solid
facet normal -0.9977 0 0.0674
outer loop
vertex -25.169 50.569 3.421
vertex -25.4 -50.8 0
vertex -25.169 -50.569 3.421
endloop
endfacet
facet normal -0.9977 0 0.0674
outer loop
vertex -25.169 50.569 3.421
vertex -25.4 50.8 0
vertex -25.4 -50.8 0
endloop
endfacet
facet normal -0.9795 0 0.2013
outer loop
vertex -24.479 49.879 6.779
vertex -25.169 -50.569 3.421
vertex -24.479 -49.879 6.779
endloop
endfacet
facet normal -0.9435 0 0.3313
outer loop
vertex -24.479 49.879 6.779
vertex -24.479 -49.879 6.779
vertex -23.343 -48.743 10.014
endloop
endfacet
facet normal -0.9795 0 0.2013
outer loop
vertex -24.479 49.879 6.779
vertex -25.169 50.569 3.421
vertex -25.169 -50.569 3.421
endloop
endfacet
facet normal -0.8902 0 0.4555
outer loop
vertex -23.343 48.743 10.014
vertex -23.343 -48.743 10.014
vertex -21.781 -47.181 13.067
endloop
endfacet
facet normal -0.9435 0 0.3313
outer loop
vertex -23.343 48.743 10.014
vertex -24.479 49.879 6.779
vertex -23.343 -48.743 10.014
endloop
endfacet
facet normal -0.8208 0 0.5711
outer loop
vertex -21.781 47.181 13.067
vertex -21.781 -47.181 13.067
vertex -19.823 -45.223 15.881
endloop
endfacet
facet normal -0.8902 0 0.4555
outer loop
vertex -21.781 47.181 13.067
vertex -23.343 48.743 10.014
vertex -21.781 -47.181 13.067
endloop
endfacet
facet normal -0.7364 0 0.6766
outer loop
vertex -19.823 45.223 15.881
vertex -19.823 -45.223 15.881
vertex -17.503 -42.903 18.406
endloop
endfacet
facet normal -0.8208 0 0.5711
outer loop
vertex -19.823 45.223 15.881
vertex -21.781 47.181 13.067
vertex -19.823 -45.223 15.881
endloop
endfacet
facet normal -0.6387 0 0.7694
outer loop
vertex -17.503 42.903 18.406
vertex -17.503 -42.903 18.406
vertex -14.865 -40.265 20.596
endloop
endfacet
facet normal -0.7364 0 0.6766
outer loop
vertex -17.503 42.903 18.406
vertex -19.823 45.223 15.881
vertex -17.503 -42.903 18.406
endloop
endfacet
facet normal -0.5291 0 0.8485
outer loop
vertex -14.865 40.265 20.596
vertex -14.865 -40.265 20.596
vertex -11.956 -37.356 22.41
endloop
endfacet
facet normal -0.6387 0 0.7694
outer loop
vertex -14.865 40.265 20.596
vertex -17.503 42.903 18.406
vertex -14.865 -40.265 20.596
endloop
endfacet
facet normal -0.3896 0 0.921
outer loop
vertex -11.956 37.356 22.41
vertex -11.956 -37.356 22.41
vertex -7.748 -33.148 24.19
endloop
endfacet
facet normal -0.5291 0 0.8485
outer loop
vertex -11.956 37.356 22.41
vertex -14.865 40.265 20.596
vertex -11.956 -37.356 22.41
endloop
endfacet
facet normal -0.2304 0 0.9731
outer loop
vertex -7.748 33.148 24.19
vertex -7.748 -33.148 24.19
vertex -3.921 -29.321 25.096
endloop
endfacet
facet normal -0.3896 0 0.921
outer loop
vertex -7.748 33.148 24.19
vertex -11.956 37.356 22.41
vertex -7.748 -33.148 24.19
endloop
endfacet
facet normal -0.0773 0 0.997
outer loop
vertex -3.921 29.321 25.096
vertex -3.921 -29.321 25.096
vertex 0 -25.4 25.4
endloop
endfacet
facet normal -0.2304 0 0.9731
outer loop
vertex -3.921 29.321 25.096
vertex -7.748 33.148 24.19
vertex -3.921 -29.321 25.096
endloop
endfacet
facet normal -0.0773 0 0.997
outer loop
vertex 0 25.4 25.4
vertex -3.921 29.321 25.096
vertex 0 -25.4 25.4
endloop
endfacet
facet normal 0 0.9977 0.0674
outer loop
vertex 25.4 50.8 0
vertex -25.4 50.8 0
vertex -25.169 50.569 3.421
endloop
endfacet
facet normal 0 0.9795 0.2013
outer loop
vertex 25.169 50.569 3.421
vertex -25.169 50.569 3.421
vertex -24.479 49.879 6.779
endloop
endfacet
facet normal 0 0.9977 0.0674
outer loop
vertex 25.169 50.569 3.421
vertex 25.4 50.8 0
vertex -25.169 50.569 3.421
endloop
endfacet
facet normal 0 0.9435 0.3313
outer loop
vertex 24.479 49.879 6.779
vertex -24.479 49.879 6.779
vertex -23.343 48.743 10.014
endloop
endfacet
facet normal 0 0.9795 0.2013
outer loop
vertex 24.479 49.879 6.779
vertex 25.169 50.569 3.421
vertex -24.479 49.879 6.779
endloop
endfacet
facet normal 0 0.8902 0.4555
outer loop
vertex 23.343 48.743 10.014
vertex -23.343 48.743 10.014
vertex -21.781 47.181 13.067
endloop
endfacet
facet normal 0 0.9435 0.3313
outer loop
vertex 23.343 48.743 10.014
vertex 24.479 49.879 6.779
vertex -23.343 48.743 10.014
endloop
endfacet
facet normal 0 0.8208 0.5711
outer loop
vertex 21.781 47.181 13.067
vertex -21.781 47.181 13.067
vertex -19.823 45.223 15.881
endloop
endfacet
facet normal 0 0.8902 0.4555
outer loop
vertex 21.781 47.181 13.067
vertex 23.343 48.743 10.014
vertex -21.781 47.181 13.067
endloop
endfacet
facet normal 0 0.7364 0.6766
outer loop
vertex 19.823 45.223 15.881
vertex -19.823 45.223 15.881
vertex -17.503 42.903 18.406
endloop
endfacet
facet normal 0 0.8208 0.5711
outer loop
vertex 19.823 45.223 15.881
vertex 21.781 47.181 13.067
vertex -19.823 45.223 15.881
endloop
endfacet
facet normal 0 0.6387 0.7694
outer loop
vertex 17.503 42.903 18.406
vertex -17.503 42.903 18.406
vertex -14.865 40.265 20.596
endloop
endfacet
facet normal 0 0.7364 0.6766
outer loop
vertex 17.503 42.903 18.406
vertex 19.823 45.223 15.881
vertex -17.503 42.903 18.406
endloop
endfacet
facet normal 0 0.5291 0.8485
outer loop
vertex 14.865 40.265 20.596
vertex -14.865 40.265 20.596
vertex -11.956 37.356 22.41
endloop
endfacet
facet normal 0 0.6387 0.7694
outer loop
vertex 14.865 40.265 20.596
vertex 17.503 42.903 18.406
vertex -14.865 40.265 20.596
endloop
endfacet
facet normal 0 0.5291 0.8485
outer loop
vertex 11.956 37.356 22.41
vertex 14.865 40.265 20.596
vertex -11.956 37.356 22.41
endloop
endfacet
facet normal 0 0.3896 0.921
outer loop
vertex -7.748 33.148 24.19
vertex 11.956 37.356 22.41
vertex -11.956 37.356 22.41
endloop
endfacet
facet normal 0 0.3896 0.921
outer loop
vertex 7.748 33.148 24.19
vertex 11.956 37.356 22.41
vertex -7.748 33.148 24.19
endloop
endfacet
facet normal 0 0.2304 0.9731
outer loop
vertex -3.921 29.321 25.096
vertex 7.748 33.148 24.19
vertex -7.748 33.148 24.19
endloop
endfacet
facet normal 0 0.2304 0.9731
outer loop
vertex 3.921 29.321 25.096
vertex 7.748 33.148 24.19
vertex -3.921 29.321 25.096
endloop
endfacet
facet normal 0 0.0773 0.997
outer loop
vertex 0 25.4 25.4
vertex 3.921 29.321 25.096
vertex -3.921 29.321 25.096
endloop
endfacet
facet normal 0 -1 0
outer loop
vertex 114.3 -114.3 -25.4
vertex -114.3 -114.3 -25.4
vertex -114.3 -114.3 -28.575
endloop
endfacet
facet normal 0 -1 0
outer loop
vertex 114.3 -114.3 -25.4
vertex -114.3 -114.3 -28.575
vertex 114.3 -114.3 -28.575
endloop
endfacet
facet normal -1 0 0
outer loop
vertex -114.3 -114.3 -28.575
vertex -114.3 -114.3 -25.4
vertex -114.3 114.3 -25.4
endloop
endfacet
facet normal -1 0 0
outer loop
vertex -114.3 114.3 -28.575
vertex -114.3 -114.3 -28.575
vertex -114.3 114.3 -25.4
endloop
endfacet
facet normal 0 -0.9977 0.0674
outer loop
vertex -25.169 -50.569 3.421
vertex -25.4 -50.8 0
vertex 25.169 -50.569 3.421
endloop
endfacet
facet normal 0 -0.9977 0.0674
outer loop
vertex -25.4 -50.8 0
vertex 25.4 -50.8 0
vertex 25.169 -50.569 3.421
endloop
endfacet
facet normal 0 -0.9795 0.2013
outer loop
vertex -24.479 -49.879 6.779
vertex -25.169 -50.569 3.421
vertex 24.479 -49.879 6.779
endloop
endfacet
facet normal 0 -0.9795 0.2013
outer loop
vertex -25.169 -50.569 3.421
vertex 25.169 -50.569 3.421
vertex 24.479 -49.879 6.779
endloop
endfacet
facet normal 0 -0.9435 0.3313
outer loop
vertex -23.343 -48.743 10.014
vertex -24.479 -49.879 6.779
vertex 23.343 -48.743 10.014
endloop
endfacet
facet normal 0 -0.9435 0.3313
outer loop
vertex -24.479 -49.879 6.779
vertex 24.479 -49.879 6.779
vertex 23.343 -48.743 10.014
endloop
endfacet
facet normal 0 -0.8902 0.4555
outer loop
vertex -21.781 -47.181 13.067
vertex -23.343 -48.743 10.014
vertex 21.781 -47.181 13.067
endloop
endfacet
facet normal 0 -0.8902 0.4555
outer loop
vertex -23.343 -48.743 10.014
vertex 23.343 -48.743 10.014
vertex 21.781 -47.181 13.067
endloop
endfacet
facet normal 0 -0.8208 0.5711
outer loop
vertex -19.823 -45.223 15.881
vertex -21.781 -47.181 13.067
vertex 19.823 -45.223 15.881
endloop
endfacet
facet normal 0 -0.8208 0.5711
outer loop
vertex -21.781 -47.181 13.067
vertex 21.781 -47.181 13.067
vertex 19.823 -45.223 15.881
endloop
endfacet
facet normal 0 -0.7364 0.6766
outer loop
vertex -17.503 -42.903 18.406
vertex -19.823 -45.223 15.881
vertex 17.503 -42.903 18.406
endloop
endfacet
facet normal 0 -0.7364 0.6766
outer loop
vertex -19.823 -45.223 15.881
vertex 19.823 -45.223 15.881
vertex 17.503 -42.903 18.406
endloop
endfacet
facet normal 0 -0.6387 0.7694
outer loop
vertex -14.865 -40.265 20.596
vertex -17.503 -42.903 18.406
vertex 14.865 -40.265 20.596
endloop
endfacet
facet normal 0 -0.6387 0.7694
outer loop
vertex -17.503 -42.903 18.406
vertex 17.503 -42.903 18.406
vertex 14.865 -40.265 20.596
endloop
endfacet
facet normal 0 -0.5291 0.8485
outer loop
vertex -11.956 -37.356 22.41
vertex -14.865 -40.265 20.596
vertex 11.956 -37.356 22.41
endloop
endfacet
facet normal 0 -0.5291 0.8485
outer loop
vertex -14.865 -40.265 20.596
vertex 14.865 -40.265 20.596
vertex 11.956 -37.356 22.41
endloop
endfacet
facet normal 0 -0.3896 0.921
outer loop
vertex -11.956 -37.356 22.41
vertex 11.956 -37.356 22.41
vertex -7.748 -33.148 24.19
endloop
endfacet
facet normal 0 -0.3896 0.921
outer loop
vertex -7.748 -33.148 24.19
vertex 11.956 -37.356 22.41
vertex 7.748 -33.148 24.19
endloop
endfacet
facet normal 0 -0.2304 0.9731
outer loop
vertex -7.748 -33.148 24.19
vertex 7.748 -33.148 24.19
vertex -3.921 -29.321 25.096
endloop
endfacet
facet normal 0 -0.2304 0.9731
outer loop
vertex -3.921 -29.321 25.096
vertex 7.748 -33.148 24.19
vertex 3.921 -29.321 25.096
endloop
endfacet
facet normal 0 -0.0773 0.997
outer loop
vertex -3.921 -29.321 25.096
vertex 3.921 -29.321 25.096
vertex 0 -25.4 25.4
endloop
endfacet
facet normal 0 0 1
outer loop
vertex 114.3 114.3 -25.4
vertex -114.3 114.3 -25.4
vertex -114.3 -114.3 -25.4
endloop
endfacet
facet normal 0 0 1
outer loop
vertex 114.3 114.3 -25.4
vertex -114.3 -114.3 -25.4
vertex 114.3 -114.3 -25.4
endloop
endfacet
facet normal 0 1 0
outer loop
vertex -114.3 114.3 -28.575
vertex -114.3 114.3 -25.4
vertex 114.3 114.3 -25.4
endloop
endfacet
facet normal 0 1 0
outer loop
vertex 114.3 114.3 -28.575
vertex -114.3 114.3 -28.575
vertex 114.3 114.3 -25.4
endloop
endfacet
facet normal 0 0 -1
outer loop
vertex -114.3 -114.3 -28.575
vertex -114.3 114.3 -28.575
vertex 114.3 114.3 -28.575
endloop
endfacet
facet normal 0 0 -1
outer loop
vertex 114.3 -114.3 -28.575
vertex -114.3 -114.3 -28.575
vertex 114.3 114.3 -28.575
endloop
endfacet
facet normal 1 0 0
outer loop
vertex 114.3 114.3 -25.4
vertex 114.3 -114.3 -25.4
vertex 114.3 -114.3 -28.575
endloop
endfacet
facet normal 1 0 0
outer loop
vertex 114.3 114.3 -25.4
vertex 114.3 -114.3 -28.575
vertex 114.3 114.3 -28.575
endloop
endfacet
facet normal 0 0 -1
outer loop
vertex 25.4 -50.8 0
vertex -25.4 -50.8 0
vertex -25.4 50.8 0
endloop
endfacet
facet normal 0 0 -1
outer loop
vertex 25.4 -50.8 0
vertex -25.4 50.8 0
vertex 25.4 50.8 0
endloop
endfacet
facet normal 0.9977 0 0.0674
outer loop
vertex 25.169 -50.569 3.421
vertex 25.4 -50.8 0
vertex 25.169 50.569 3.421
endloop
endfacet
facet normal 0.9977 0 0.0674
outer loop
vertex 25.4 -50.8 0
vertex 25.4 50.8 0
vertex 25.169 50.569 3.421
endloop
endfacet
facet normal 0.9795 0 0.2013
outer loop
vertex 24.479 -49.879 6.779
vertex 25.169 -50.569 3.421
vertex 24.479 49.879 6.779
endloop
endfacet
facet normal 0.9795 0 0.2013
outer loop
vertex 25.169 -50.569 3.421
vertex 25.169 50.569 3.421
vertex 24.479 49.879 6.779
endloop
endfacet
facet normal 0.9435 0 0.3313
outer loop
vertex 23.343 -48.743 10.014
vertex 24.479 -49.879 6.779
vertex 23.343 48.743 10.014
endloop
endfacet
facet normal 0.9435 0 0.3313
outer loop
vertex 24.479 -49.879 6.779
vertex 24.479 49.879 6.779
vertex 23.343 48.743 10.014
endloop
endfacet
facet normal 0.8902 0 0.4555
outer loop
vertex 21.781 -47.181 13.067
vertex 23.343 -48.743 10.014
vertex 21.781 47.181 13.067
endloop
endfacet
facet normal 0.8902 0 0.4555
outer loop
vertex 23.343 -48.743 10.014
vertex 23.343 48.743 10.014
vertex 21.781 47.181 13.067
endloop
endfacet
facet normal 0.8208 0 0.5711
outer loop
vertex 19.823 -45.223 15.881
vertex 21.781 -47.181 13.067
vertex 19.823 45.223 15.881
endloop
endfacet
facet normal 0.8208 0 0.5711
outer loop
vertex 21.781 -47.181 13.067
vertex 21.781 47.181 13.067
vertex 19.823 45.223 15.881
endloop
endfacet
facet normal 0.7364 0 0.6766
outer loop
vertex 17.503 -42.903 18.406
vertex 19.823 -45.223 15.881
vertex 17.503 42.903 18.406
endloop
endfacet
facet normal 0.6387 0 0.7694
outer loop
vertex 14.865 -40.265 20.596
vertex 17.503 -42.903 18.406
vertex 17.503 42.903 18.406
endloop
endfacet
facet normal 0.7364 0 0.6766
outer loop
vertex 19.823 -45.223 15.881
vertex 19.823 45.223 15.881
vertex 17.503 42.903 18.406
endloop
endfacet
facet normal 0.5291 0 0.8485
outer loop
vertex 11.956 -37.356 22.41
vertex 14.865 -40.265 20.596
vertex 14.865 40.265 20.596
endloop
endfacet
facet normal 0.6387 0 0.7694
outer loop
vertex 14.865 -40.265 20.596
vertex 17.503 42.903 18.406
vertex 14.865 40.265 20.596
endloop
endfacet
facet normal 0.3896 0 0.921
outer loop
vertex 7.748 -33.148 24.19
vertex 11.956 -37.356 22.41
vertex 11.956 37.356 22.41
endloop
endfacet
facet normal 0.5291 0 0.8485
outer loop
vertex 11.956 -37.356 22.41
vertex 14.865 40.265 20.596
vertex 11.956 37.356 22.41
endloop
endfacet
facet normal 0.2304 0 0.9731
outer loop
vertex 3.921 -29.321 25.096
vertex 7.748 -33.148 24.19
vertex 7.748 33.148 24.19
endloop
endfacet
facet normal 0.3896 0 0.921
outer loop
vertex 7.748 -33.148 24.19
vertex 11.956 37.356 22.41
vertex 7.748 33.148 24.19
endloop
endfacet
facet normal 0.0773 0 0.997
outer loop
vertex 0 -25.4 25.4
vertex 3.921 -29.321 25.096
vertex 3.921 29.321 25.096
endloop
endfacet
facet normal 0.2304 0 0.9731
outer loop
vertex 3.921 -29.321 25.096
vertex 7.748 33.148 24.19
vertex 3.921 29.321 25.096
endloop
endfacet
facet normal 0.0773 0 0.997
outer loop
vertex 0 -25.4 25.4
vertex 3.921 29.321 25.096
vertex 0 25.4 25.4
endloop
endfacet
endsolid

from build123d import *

# Parameters (mm, degrees)
F0_W     = 50.8
F0_H     = 101.6
F1_DEPTH = 25.4
F2_R     = 25.39999
F4_W     = 228.6
F4_H     = 228.6
F5_DEPTH = 3.175


# Not quite as in the source:
# - a fillet or chamfer is up to 0.001 mm smaller than in the source, because OpenCascade refuses the exact size


with BuildPart() as f1:
    # F0 (on Top) → F1 (new body)
    with BuildSketch(Plane.XY):
        Rectangle(F0_W, F0_H)
    extrude(amount=F1_DEPTH)

    # F2 (radius 25.4 in the source; OpenCascade refuses exactly that, so slightly less here)
    f2_edges = [f1.edges().sort_by_distance(p)[0] for p in [
        (-25.4, 0, 25.4),
        (0, -50.8, 25.4),
        (25.4, 0, 25.4),
        (0, 50.8, 25.4),
    ]]
    fillet(f2_edges, radius=F2_R)


with BuildPart() as f5:
    # F4 (on offset) → F5 (new body)
    with BuildSketch(Plane.XY.offset(-25.4)):
        Rectangle(F4_W, F4_H)
    extrude(amount=-F5_DEPTH)


solid = Compound([f1.part, f5.part])
